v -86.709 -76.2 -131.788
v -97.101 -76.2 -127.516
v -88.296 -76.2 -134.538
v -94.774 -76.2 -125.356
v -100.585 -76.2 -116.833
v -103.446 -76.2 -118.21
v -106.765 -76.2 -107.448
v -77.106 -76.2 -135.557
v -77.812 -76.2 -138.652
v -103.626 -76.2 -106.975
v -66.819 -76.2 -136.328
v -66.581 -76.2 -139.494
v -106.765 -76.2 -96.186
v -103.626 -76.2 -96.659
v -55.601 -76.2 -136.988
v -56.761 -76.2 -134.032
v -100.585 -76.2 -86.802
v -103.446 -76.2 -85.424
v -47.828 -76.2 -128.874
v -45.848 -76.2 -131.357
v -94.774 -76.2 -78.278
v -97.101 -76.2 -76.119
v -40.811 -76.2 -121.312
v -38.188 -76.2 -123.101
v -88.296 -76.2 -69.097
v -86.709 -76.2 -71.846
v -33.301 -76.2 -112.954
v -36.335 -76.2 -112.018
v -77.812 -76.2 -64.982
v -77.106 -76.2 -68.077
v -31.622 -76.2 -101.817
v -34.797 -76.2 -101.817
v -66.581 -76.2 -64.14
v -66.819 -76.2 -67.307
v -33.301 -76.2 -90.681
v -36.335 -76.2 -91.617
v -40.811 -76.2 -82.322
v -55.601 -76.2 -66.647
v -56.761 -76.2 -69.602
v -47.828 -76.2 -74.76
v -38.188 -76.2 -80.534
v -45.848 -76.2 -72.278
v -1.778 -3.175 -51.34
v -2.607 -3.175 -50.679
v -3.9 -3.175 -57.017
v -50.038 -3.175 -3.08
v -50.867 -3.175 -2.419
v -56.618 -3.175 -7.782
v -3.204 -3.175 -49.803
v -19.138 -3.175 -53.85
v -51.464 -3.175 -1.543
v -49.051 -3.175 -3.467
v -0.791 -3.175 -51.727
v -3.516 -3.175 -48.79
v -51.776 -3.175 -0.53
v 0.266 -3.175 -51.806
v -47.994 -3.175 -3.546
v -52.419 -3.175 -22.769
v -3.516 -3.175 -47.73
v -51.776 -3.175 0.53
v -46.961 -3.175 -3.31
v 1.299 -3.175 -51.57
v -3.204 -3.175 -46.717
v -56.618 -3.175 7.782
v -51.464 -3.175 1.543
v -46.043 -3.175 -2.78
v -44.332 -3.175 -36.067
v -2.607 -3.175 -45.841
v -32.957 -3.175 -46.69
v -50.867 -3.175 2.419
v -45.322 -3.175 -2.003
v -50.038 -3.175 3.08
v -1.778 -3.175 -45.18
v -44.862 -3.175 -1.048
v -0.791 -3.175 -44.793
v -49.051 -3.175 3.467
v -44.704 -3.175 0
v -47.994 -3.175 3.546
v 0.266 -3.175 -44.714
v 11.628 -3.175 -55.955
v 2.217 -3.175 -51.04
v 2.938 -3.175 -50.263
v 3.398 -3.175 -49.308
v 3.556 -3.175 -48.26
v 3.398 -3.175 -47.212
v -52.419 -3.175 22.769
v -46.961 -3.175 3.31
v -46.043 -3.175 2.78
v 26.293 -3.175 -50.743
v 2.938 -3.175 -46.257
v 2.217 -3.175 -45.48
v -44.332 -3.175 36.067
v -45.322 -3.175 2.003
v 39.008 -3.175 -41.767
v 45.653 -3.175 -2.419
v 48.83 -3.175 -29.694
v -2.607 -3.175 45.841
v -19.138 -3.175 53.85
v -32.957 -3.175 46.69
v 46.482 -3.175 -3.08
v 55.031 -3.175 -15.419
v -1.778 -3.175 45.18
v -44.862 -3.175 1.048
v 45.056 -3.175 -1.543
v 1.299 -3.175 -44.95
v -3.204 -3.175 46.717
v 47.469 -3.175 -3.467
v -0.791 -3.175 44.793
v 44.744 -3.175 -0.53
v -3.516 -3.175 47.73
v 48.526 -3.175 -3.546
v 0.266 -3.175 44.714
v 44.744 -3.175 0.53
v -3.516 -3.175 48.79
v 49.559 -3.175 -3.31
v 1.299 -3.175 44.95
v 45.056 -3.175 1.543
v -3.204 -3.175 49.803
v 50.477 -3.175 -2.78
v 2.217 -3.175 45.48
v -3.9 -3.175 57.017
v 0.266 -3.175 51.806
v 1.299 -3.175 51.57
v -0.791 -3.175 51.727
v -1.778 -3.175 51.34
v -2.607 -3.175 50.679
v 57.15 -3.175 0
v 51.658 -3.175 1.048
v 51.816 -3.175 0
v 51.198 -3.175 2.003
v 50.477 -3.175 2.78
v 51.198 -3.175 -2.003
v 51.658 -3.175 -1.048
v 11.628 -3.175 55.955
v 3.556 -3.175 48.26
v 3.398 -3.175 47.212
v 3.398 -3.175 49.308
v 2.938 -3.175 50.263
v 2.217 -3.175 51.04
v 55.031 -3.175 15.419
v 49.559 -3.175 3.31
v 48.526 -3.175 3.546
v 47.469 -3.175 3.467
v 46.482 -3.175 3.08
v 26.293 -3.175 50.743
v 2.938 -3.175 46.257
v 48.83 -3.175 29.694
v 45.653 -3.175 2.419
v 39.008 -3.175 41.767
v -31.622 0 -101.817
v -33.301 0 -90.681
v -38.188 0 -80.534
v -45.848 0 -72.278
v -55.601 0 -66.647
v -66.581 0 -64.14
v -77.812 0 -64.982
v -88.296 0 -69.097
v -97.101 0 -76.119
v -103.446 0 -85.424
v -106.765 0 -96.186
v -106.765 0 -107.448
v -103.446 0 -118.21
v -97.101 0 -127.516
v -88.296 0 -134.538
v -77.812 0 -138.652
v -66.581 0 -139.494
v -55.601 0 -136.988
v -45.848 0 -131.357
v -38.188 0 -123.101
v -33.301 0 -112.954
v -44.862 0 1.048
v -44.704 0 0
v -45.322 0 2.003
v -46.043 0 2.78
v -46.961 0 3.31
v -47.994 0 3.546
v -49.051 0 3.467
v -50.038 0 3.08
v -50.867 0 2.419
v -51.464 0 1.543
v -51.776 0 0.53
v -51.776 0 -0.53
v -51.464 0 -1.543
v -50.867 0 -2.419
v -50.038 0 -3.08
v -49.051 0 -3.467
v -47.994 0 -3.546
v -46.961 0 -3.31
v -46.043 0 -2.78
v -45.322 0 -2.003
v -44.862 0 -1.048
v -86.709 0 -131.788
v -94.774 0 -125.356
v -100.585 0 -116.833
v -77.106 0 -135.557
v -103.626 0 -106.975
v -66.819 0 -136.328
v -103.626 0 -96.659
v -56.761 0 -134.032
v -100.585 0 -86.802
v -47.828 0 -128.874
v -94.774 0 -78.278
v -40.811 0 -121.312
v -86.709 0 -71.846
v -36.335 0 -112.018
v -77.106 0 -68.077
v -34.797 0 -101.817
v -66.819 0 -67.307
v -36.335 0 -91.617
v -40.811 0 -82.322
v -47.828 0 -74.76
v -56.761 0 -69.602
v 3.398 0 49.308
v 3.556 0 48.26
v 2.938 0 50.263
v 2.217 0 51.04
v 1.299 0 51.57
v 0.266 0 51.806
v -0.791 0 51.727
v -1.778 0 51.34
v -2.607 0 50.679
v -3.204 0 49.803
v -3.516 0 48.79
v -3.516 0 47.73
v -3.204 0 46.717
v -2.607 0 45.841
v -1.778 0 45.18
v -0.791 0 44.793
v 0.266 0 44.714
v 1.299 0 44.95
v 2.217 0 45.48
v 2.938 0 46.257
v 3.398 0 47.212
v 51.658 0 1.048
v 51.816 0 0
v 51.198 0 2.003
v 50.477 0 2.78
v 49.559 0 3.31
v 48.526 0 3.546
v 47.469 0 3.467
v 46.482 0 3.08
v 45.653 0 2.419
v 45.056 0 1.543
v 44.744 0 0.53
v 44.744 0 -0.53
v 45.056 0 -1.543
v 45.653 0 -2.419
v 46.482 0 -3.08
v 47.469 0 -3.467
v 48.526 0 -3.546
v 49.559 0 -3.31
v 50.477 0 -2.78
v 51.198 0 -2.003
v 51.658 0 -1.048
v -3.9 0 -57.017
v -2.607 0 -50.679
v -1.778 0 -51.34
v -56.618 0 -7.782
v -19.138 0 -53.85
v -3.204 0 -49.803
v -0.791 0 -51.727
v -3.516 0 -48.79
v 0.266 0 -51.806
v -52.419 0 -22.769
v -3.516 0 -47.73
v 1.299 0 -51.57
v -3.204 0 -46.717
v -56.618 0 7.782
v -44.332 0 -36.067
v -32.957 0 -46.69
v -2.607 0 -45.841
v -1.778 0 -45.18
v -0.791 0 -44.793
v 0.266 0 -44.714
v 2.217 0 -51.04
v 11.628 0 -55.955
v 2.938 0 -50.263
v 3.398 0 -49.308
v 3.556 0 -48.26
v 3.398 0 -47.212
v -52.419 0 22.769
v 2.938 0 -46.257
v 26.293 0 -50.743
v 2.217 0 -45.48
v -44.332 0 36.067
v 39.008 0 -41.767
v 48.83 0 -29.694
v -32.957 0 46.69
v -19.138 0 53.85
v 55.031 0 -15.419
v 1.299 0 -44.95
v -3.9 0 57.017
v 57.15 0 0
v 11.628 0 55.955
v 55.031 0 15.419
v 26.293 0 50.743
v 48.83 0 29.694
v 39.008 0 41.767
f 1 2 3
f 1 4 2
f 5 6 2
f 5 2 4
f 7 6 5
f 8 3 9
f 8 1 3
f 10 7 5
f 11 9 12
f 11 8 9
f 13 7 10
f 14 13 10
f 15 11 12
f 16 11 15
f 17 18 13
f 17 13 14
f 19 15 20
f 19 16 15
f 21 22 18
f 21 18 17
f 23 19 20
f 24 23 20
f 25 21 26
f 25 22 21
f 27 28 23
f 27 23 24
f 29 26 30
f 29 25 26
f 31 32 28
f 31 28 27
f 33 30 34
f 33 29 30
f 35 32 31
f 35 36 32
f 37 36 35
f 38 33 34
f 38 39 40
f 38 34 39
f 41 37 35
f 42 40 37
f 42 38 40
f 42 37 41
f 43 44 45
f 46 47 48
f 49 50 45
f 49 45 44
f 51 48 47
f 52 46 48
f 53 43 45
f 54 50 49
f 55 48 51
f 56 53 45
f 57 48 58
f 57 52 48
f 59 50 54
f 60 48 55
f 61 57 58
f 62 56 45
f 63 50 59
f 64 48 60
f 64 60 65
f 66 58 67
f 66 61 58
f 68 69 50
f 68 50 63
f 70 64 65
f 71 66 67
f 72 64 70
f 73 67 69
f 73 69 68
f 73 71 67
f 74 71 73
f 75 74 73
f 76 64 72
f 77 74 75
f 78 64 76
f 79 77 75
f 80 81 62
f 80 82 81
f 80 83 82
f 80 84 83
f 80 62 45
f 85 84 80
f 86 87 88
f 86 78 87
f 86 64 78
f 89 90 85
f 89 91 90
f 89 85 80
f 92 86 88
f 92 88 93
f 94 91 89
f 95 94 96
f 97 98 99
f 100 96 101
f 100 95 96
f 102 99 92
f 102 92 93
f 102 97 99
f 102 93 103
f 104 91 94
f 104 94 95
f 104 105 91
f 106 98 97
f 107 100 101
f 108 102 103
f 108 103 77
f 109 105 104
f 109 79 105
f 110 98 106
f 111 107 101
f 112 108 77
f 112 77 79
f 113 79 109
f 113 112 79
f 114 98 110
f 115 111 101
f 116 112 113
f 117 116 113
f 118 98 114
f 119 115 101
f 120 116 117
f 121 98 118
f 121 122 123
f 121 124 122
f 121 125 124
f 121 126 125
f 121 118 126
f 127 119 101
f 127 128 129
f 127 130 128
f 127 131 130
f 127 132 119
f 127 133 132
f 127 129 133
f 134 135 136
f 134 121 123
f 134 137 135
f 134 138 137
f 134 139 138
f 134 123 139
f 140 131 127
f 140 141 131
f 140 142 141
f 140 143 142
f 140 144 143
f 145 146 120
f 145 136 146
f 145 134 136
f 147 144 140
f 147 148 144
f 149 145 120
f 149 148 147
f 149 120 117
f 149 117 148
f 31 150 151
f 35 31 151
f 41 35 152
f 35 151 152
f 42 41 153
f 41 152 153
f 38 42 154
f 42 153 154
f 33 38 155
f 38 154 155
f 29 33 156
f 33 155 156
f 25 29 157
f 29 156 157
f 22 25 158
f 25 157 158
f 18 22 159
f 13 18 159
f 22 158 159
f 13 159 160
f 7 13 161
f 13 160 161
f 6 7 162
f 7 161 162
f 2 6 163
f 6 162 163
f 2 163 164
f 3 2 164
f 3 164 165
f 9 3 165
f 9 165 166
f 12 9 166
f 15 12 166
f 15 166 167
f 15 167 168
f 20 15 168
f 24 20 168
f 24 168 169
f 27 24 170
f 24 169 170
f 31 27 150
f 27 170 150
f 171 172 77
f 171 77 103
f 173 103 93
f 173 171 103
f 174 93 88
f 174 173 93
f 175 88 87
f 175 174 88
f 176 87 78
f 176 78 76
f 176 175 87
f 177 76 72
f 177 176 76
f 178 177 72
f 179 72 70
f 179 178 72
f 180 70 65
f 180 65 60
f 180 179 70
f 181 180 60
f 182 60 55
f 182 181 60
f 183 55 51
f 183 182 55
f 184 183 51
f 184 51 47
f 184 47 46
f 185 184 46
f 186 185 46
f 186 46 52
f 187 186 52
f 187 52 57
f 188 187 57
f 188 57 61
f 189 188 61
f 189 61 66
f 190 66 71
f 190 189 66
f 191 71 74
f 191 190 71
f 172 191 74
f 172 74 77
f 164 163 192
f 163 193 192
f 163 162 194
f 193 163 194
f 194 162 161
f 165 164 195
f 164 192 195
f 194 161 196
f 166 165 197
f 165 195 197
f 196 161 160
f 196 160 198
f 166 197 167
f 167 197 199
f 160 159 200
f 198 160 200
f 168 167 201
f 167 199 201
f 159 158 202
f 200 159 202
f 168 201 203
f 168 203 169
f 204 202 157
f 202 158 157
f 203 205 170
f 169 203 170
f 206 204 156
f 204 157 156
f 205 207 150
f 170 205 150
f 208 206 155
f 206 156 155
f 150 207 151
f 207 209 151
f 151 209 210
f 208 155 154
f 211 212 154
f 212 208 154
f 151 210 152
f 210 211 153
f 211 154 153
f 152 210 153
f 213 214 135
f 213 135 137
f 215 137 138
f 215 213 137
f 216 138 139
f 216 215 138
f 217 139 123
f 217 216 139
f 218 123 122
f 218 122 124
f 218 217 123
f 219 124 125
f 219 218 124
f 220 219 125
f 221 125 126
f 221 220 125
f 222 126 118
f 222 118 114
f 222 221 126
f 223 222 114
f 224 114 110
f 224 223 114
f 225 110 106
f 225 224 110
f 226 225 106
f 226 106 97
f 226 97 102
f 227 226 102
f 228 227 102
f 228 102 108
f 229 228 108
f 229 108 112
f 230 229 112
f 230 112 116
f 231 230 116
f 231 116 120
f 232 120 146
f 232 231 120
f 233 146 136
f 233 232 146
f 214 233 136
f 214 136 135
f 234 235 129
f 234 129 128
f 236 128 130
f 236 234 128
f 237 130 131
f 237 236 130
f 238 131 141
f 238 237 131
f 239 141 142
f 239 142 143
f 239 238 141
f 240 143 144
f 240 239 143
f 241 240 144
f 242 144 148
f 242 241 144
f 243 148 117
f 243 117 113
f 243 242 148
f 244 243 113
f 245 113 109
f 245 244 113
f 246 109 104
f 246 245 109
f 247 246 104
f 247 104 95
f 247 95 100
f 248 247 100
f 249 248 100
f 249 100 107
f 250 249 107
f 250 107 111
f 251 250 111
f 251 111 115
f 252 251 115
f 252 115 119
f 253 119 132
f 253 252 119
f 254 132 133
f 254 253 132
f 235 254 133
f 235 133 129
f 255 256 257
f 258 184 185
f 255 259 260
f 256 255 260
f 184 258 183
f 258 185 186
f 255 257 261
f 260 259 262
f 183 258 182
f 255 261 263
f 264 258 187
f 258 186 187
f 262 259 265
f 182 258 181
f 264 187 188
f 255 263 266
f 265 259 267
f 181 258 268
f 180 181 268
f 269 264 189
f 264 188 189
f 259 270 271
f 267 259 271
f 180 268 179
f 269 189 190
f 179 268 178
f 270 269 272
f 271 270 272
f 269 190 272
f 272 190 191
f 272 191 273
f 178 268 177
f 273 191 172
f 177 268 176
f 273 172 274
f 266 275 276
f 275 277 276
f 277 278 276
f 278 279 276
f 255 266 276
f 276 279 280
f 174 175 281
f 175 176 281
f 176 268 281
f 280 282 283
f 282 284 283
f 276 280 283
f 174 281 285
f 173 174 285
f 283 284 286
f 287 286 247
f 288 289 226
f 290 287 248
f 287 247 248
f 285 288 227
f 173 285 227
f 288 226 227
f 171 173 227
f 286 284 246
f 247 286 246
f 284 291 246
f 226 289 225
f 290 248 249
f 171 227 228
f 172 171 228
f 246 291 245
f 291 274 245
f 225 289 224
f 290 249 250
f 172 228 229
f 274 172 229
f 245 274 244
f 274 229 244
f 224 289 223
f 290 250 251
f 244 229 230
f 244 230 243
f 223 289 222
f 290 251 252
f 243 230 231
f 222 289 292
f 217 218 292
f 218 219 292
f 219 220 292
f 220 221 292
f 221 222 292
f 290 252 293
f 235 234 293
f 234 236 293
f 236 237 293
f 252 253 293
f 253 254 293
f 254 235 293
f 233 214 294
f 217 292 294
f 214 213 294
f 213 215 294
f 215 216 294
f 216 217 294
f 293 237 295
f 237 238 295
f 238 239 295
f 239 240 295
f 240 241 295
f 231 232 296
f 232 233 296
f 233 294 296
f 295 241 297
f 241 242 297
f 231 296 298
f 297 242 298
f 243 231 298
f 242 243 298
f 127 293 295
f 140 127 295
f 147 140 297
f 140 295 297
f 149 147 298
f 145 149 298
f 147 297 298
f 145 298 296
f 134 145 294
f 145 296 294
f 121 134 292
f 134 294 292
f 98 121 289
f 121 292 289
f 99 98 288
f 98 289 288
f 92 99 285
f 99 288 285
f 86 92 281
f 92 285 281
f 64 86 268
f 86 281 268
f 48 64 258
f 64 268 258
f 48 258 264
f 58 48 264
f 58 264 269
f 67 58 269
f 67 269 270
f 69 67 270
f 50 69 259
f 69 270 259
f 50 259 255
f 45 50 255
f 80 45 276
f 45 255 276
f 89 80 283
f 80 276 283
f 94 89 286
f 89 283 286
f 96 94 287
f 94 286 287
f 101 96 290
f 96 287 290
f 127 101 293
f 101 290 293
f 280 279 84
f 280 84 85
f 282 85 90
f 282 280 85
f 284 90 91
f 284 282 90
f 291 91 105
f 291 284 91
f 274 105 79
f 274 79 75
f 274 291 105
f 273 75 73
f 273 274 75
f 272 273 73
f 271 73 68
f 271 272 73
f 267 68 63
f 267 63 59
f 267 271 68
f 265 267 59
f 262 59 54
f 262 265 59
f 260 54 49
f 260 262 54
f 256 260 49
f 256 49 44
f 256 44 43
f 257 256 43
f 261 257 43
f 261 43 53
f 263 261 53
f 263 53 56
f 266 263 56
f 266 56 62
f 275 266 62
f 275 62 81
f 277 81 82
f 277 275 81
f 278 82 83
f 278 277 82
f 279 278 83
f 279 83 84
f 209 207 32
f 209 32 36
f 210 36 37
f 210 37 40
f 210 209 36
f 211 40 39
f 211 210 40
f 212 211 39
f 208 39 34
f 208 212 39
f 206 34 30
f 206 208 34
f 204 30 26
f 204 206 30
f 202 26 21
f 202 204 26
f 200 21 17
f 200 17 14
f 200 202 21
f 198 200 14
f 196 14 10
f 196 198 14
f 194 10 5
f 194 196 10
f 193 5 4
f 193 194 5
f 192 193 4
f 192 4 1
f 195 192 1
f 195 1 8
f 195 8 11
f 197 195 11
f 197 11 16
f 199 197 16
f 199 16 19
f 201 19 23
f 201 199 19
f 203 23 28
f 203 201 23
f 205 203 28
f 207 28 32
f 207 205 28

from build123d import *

# Parameters (mm, degrees)
F0_R     = 57.15
F0_R_2   = 3.556
F1_DEPTH = 3.175
F2_R     = 37.7825
F2_R_2   = 34.6075
F3_DEPTH = 76.2


# Not quite as in the source:
# - a feature names something its author has since deleted; it is built from what else it names


with BuildPart() as f1:
    # F0 (on Front) → F1 (new body)
    with BuildSketch(Plane.XZ):
        Circle(F0_R)
        with Locations((0, -48.26)):
            Circle(F0_R_2, mode=Mode.SUBTRACT)
        with Locations((-48.26, 0)):
            Circle(F0_R_2, mode=Mode.SUBTRACT)
        with Locations((48.26, 0)):
            Circle(F0_R_2, mode=Mode.SUBTRACT)
        with Locations((0, 48.26)):
            Circle(F0_R_2, mode=Mode.SUBTRACT)
    extrude(amount=F1_DEPTH)


with BuildPart() as f3:
    # F2 (on Front) → F3 (new body)
    with BuildSketch(Plane.XZ):
        with Locations((-69.4049596786, -101.8172428012)):
            Circle(F2_R)
        with Locations((-69.4049596786, -101.8172428012)):
            Circle(F2_R_2, mode=Mode.SUBTRACT)
    extrude(amount=F3_DEPTH)


solid = Compound([f1.part, f3.part])
